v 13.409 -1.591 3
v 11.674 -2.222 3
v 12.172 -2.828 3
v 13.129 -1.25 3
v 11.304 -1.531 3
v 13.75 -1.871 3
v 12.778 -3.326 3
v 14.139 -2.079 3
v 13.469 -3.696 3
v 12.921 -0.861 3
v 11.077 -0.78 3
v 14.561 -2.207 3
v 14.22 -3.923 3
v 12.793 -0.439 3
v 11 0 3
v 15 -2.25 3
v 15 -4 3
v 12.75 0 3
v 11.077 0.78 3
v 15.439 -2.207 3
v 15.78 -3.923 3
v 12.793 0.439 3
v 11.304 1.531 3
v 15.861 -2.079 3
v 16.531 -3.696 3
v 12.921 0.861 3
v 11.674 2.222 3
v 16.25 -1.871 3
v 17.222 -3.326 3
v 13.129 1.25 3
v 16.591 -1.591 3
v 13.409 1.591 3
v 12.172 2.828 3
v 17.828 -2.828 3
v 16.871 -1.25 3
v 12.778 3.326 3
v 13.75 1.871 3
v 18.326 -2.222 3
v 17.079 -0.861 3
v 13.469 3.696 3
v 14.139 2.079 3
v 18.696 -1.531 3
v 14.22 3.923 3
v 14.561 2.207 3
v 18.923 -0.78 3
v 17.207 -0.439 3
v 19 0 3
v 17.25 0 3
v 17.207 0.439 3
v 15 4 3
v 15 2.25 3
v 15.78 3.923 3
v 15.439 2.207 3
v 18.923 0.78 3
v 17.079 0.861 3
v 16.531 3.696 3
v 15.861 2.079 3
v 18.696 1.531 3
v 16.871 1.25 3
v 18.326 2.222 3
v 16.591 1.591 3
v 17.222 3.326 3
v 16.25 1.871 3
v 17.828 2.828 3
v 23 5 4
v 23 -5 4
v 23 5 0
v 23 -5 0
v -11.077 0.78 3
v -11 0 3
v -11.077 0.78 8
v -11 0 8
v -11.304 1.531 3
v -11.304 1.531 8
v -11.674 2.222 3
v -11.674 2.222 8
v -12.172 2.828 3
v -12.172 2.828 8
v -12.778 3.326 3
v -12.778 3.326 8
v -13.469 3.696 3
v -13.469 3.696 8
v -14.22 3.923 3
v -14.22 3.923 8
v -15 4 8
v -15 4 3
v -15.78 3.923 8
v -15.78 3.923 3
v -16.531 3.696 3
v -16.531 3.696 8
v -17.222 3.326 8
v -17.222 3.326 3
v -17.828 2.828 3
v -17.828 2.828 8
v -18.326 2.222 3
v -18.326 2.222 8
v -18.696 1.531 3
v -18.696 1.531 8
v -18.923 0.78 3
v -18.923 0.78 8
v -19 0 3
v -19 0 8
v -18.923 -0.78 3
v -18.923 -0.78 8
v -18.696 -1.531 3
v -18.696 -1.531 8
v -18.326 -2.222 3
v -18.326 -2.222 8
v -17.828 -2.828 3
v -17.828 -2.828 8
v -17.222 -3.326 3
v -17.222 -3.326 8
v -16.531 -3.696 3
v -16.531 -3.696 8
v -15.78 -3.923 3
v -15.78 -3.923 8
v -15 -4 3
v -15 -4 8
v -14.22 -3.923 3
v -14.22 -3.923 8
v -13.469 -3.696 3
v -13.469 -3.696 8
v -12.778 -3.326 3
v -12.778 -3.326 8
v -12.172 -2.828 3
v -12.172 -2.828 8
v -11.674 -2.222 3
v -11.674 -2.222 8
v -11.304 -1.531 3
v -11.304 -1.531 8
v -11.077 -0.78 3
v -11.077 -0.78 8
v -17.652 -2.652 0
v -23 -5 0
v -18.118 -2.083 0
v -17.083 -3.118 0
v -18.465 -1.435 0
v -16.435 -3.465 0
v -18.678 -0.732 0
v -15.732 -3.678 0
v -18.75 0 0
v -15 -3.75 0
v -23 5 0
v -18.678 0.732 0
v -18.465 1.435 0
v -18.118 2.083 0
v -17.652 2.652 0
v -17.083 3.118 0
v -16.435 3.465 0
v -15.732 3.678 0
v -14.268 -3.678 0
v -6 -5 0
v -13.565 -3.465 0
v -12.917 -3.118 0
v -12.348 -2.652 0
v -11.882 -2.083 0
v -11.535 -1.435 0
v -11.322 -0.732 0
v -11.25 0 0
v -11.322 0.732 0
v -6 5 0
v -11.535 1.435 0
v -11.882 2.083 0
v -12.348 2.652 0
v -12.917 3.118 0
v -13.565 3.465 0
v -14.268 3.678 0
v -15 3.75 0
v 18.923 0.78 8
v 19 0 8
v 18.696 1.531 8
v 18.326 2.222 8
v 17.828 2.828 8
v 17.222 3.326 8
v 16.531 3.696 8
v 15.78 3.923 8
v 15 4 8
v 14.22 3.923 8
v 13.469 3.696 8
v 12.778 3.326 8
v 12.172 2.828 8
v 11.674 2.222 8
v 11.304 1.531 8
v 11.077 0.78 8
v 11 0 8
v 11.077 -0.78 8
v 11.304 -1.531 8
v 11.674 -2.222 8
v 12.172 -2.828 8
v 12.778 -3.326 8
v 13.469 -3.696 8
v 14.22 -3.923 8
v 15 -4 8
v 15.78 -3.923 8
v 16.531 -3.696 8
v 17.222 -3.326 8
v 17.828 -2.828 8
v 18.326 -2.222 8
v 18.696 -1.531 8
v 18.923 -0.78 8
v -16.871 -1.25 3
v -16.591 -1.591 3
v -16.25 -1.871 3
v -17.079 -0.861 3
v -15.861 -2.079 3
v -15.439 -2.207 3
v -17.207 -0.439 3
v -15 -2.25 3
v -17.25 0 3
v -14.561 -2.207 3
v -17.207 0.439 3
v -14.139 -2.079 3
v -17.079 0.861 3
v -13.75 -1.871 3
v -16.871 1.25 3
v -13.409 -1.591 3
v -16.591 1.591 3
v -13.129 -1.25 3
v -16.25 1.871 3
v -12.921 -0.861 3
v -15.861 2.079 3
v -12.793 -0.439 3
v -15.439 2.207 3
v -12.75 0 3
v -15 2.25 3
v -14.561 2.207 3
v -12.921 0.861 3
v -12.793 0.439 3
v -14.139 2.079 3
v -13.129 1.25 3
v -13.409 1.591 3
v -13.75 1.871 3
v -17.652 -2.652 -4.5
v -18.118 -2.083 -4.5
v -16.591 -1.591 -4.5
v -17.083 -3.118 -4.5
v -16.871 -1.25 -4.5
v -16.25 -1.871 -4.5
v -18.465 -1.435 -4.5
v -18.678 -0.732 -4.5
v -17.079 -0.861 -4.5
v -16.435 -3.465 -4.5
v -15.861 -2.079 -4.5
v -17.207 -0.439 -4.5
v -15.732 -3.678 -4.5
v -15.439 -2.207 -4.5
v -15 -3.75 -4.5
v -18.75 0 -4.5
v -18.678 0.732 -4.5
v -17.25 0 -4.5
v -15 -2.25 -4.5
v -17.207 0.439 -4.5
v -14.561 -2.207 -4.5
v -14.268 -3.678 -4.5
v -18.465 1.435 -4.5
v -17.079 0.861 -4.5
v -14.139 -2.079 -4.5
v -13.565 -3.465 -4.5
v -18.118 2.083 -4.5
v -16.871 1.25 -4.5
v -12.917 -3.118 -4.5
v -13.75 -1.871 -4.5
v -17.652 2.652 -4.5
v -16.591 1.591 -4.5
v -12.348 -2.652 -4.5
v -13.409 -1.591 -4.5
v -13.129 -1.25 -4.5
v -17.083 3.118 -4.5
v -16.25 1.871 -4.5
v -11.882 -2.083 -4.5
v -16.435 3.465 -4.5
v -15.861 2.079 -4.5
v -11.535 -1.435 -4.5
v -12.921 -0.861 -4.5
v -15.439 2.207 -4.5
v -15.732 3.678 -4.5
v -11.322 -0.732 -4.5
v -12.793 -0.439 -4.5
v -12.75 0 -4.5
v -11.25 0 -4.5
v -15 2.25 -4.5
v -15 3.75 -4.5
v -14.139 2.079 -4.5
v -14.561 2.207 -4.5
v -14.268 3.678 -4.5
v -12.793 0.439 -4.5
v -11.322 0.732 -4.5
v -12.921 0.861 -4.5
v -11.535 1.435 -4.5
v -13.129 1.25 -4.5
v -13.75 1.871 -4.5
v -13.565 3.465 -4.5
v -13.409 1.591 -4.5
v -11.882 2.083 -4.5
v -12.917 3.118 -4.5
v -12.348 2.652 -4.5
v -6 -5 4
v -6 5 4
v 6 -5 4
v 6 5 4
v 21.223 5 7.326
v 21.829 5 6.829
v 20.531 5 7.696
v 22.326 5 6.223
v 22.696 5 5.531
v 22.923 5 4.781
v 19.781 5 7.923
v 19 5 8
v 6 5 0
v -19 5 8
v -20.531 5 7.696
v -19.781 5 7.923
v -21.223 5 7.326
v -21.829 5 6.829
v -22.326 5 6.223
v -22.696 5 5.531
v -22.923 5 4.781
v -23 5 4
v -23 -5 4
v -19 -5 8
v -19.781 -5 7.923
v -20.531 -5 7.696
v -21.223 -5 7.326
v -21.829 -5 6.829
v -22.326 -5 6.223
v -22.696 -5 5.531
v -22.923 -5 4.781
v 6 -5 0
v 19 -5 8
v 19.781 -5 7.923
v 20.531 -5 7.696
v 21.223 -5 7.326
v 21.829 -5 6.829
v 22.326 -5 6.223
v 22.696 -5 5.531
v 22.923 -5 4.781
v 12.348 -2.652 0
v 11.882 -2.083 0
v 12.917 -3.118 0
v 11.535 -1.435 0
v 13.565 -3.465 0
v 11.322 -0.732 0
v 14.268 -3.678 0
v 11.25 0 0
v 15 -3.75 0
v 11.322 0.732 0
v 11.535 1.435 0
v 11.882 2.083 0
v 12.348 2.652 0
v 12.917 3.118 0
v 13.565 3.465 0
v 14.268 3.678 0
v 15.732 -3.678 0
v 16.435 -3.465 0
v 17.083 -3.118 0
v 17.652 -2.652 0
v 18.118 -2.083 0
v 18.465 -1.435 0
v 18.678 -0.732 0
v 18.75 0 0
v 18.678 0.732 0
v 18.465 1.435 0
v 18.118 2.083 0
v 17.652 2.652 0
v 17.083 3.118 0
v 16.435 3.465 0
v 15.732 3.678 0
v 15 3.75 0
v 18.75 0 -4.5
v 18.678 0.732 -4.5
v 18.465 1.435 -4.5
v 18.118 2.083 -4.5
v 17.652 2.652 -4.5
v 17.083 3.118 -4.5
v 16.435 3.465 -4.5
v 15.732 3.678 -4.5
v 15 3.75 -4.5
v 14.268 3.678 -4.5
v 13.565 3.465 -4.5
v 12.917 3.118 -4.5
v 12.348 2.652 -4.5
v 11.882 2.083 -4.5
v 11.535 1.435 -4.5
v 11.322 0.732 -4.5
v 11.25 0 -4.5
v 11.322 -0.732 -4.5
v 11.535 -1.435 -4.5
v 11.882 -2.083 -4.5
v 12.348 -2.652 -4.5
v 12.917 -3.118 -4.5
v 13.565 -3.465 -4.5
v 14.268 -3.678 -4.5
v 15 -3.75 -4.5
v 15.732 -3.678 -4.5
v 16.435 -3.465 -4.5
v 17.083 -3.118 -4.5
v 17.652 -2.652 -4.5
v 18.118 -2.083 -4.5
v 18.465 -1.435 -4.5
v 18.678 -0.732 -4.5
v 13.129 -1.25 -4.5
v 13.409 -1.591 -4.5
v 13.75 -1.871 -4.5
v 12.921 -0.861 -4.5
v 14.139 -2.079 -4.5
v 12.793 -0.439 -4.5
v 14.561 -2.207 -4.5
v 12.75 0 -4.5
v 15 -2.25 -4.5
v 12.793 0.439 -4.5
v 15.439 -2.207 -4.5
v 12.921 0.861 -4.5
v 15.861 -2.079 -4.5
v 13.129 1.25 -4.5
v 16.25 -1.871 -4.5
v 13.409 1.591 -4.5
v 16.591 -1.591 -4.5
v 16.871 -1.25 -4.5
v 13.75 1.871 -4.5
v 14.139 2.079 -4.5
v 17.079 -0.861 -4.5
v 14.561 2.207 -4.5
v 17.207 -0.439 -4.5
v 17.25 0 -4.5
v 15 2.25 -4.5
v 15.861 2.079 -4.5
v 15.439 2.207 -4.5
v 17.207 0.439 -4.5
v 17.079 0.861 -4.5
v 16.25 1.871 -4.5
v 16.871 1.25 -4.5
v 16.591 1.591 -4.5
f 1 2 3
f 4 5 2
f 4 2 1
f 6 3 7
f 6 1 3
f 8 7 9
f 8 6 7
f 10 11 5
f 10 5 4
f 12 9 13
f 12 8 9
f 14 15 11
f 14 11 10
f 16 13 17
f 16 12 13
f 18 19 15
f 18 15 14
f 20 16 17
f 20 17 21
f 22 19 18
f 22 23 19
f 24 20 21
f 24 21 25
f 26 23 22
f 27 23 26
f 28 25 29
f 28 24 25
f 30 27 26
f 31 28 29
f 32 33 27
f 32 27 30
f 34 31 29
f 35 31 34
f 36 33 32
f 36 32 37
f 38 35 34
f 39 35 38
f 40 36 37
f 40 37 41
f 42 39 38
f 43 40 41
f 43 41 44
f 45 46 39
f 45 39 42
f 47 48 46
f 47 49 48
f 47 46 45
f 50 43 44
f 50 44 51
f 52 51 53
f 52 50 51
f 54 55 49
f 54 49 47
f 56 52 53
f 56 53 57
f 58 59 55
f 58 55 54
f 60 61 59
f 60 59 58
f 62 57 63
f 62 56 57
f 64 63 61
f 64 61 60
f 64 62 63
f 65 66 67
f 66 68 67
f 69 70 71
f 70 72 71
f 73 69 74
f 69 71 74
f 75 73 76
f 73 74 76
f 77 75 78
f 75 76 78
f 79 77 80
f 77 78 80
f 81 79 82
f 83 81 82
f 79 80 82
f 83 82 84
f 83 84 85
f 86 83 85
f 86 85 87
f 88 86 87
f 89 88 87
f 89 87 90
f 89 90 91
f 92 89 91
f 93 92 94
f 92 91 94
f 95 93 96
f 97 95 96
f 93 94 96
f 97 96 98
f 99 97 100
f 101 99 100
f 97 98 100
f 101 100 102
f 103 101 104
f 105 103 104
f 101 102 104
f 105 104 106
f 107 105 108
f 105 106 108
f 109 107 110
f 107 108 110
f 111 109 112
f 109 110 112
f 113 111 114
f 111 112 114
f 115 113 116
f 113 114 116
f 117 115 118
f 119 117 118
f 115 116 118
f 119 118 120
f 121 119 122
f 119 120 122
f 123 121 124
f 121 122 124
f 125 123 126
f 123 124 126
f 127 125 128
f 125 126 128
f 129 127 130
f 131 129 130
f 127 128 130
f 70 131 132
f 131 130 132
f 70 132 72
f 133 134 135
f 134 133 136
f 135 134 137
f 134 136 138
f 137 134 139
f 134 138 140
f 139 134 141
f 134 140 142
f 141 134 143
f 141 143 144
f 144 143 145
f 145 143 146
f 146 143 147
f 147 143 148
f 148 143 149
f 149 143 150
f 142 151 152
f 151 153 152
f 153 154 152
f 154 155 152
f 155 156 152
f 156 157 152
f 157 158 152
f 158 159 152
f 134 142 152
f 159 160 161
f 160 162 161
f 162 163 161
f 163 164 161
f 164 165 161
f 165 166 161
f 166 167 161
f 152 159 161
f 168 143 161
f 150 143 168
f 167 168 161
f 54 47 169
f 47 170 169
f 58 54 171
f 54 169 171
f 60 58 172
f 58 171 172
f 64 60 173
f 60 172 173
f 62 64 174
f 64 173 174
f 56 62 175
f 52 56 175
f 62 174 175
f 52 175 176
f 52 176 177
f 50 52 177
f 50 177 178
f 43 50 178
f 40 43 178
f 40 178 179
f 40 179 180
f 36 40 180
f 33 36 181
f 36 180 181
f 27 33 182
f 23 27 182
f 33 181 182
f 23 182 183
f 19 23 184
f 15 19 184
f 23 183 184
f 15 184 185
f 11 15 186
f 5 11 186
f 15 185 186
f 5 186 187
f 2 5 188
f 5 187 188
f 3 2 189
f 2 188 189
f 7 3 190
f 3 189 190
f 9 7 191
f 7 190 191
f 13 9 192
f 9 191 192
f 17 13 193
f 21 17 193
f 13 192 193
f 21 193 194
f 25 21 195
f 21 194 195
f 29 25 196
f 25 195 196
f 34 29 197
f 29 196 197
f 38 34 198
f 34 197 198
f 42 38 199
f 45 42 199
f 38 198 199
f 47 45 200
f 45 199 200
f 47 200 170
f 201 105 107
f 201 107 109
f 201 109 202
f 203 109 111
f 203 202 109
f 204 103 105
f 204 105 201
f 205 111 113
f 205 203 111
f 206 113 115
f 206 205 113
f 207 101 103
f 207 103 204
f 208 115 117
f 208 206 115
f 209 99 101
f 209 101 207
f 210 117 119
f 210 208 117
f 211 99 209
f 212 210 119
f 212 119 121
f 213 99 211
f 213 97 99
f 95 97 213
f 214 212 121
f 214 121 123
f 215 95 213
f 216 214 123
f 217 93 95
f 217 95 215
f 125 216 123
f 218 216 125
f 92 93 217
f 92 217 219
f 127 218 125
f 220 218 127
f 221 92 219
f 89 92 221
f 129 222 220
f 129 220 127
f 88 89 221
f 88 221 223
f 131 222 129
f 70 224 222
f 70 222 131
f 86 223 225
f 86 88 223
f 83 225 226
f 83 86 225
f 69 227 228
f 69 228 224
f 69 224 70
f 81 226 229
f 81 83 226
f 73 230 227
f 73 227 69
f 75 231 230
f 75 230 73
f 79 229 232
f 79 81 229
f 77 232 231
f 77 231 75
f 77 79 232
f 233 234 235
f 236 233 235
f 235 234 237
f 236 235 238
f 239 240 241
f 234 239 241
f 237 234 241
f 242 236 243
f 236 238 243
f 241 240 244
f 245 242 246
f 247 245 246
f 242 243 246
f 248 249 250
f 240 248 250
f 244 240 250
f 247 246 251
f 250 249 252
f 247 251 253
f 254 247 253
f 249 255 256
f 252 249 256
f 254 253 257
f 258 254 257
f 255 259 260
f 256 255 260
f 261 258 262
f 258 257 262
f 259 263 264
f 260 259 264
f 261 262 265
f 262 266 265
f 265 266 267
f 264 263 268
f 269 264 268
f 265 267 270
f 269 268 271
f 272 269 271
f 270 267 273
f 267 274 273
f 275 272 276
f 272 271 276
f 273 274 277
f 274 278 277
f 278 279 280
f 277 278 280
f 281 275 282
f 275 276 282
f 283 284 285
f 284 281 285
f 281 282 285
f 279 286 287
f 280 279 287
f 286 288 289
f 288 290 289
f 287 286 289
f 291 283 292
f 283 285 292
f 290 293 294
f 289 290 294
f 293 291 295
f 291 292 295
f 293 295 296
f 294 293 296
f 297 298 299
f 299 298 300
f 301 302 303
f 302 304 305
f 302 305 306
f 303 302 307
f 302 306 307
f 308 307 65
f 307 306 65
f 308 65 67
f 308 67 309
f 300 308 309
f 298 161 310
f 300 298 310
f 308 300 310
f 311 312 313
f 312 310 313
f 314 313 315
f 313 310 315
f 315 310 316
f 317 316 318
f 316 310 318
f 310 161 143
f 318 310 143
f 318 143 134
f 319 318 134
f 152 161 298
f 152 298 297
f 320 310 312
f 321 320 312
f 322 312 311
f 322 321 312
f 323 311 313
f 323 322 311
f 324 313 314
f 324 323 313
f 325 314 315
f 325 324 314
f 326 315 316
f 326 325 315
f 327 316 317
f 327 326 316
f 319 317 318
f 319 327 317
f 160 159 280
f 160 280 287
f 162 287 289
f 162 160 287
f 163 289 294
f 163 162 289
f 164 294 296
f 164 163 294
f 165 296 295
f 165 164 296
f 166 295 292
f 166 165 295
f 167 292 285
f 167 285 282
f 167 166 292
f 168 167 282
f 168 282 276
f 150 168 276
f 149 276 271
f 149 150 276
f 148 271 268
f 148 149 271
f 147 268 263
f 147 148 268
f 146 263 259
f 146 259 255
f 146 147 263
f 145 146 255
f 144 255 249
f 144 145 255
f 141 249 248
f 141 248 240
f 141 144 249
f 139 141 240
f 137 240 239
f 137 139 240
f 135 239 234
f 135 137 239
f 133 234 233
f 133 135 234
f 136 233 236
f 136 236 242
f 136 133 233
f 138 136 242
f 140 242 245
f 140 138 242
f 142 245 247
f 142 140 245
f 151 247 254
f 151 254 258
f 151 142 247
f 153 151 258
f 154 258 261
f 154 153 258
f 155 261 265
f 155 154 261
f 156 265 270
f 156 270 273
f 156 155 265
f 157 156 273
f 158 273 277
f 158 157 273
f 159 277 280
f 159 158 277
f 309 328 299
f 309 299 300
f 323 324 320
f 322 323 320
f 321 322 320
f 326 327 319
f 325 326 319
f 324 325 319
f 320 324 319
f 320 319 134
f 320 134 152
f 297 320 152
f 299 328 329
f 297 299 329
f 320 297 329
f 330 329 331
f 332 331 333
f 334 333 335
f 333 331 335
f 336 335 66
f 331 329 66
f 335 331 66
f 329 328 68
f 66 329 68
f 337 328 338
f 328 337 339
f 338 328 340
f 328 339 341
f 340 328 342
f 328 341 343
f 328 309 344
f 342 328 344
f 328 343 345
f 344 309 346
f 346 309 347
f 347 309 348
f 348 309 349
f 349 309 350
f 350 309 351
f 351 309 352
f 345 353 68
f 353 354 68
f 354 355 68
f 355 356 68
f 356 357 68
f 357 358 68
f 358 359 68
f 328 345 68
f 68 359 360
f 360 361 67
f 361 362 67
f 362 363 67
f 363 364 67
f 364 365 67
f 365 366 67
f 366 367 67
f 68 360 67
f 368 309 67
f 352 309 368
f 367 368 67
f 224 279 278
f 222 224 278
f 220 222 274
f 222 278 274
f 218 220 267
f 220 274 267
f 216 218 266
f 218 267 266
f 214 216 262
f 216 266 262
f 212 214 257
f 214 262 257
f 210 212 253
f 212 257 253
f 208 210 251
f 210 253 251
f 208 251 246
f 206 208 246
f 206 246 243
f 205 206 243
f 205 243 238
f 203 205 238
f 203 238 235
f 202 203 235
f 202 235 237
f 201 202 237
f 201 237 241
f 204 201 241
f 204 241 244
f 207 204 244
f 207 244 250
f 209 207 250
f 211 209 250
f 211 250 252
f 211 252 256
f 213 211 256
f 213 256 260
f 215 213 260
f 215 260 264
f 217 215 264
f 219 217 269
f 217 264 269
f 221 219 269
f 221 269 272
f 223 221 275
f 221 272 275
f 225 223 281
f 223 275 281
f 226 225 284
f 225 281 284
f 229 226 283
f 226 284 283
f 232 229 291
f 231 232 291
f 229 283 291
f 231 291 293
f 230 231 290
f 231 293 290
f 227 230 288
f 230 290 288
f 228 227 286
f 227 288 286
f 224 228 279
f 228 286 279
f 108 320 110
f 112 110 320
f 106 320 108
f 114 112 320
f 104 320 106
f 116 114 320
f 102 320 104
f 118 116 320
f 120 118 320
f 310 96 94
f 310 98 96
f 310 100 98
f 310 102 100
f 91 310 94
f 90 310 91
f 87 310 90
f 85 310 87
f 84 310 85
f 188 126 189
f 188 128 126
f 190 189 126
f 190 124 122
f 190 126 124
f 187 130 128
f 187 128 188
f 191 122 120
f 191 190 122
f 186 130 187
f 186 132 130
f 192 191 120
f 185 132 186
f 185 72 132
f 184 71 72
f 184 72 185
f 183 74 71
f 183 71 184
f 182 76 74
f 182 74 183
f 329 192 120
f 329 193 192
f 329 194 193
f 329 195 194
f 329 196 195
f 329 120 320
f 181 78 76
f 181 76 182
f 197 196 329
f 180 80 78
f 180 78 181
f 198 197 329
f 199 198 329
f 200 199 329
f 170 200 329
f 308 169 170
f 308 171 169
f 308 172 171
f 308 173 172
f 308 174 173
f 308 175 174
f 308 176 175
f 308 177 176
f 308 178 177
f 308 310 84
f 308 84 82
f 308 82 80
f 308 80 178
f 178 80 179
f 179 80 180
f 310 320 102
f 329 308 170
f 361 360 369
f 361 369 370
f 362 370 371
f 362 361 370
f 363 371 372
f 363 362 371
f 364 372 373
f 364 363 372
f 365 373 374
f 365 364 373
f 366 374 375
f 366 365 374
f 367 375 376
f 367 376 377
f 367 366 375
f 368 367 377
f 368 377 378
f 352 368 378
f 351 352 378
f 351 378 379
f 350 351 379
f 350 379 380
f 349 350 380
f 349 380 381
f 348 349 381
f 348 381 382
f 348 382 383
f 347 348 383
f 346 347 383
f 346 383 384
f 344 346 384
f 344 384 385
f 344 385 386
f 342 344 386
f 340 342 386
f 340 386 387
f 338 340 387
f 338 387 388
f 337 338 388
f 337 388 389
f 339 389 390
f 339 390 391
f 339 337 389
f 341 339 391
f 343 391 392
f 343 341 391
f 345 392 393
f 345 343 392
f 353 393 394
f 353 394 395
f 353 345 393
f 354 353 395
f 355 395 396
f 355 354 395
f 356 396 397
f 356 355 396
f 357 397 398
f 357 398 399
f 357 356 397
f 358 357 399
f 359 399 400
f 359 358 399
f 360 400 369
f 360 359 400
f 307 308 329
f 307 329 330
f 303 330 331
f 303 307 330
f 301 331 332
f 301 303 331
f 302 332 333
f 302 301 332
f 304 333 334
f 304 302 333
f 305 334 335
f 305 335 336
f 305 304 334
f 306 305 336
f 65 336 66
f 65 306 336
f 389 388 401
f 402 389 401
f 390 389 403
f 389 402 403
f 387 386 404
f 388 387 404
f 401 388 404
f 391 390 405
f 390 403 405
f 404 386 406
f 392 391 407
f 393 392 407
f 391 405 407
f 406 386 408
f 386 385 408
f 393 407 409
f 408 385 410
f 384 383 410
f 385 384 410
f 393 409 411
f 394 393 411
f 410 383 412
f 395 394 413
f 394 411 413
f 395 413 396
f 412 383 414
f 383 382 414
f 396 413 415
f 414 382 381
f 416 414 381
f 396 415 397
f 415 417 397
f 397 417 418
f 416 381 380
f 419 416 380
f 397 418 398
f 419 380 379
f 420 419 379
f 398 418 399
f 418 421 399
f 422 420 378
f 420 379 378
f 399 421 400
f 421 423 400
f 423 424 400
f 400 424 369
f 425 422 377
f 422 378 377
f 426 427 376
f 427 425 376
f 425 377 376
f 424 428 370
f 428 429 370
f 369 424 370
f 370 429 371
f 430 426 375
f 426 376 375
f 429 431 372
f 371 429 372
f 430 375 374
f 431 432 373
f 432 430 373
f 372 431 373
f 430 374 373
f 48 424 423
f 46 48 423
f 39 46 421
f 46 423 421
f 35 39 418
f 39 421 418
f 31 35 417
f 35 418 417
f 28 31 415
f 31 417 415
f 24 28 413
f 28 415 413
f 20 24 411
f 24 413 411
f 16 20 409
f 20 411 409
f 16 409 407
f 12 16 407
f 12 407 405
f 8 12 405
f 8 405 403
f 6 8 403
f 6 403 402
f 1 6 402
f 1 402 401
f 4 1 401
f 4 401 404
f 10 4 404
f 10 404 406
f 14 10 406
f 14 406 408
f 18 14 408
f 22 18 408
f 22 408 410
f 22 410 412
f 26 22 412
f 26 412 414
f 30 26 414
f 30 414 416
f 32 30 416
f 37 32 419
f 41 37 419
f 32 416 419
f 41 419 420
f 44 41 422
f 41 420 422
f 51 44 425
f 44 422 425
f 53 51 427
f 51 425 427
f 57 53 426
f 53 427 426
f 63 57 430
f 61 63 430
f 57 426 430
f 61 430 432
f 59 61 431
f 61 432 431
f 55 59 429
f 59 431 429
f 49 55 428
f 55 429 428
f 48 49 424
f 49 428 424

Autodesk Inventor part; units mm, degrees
ref_plane "YZ Plane" through (0, 0, 0) normal (1, 0, 0) x (0, 1, 0)
ref_plane "XZ Plane" through (0, 0, 0) normal (0, 1, 0) x (-1, 0, 0)
ref_plane "XY Plane" through (0, 0, 0) normal (0, 0, 1) x (1, 0, 0)
sketch "Szkic1" plane through (0, 0, 0) normal (0, 0, 1) x (1, 0, 0)
  line L0 (-23, -5) -> (23, -5)
  line L1 (23, -5) -> (23, 5)
  line L2 (23, 5) -> (-23, 5)
  line L3 (-23, 5) -> (-23, -5)
  line L4 (-23, -5) -> (23, 5) construction
  line L5 (23, -5) -> (-23, 5) construction
  circle A0 centre (-15, 0) radius 3.75
  circle A1 centre (-15, 0) radius 2.25
  circle A2 centre (15, 0) radius 3.75
  circle A3 centre (15, 0) radius 2.25
  line L6 (-6, -5) -> (6, -5)
  line L7 (6, -5) -> (6, 5)
  line L8 (6, 5) -> (-6, 5)
  line L9 (-6, 5) -> (-6, -5)
  line L10 (-6, -5) -> (6, 5) construction
  line L11 (6, -5) -> (-6, 5) construction
  circle A4 centre (-15, 0) radius 4
  circle A5 centre (15, 0) radius 4
  point P0 (0, 0)
  point P1 (0, 0)
  dimension "d1" = 10
  dimension "d3" = 7.5
  dimension "d4" = 4.5
  dimension "d6" = 15
  dimension "d7" = 15
  dimension "d8" = 8
  dimension "d9" = 6
  dimension "d18" = 8
  dimension "d19" = 8
extrude "Wyciągnięcie proste1" add sketch "Szkic1" along normal blind 8 contours L3 L2 L9 L0 | L9 L2 L7 L0 | L7 L2 L1 L0 | A0 | A1 | A2 | A3 | A4 | A5
extrude "Wyciągnięcie proste2" cut sketch "Szkic1" along normal blind 4 contours L9 L2 L7 L0
extrude "Wyciągnięcie proste3" cut sketch "Szkic1" along normal through all contours A1 | A3
extrude "Wyciągnięcie proste4" add sketch "Szkic1" against normal blind 4.5 contours A0 | A2
extrude "Wyciągnięcie proste5" cut sketch "Szkic1" against normal blind 5 from surface at 8 contours A0 | A1 | A2 | A3 | A4 | A5
fillet "Zaokrąglenie1" radius 4 2 edges at (23, 0, 8) (-23, 0, 8)
properties part number "ZTopCable" material "Tworzywo sztuczne ABS"
